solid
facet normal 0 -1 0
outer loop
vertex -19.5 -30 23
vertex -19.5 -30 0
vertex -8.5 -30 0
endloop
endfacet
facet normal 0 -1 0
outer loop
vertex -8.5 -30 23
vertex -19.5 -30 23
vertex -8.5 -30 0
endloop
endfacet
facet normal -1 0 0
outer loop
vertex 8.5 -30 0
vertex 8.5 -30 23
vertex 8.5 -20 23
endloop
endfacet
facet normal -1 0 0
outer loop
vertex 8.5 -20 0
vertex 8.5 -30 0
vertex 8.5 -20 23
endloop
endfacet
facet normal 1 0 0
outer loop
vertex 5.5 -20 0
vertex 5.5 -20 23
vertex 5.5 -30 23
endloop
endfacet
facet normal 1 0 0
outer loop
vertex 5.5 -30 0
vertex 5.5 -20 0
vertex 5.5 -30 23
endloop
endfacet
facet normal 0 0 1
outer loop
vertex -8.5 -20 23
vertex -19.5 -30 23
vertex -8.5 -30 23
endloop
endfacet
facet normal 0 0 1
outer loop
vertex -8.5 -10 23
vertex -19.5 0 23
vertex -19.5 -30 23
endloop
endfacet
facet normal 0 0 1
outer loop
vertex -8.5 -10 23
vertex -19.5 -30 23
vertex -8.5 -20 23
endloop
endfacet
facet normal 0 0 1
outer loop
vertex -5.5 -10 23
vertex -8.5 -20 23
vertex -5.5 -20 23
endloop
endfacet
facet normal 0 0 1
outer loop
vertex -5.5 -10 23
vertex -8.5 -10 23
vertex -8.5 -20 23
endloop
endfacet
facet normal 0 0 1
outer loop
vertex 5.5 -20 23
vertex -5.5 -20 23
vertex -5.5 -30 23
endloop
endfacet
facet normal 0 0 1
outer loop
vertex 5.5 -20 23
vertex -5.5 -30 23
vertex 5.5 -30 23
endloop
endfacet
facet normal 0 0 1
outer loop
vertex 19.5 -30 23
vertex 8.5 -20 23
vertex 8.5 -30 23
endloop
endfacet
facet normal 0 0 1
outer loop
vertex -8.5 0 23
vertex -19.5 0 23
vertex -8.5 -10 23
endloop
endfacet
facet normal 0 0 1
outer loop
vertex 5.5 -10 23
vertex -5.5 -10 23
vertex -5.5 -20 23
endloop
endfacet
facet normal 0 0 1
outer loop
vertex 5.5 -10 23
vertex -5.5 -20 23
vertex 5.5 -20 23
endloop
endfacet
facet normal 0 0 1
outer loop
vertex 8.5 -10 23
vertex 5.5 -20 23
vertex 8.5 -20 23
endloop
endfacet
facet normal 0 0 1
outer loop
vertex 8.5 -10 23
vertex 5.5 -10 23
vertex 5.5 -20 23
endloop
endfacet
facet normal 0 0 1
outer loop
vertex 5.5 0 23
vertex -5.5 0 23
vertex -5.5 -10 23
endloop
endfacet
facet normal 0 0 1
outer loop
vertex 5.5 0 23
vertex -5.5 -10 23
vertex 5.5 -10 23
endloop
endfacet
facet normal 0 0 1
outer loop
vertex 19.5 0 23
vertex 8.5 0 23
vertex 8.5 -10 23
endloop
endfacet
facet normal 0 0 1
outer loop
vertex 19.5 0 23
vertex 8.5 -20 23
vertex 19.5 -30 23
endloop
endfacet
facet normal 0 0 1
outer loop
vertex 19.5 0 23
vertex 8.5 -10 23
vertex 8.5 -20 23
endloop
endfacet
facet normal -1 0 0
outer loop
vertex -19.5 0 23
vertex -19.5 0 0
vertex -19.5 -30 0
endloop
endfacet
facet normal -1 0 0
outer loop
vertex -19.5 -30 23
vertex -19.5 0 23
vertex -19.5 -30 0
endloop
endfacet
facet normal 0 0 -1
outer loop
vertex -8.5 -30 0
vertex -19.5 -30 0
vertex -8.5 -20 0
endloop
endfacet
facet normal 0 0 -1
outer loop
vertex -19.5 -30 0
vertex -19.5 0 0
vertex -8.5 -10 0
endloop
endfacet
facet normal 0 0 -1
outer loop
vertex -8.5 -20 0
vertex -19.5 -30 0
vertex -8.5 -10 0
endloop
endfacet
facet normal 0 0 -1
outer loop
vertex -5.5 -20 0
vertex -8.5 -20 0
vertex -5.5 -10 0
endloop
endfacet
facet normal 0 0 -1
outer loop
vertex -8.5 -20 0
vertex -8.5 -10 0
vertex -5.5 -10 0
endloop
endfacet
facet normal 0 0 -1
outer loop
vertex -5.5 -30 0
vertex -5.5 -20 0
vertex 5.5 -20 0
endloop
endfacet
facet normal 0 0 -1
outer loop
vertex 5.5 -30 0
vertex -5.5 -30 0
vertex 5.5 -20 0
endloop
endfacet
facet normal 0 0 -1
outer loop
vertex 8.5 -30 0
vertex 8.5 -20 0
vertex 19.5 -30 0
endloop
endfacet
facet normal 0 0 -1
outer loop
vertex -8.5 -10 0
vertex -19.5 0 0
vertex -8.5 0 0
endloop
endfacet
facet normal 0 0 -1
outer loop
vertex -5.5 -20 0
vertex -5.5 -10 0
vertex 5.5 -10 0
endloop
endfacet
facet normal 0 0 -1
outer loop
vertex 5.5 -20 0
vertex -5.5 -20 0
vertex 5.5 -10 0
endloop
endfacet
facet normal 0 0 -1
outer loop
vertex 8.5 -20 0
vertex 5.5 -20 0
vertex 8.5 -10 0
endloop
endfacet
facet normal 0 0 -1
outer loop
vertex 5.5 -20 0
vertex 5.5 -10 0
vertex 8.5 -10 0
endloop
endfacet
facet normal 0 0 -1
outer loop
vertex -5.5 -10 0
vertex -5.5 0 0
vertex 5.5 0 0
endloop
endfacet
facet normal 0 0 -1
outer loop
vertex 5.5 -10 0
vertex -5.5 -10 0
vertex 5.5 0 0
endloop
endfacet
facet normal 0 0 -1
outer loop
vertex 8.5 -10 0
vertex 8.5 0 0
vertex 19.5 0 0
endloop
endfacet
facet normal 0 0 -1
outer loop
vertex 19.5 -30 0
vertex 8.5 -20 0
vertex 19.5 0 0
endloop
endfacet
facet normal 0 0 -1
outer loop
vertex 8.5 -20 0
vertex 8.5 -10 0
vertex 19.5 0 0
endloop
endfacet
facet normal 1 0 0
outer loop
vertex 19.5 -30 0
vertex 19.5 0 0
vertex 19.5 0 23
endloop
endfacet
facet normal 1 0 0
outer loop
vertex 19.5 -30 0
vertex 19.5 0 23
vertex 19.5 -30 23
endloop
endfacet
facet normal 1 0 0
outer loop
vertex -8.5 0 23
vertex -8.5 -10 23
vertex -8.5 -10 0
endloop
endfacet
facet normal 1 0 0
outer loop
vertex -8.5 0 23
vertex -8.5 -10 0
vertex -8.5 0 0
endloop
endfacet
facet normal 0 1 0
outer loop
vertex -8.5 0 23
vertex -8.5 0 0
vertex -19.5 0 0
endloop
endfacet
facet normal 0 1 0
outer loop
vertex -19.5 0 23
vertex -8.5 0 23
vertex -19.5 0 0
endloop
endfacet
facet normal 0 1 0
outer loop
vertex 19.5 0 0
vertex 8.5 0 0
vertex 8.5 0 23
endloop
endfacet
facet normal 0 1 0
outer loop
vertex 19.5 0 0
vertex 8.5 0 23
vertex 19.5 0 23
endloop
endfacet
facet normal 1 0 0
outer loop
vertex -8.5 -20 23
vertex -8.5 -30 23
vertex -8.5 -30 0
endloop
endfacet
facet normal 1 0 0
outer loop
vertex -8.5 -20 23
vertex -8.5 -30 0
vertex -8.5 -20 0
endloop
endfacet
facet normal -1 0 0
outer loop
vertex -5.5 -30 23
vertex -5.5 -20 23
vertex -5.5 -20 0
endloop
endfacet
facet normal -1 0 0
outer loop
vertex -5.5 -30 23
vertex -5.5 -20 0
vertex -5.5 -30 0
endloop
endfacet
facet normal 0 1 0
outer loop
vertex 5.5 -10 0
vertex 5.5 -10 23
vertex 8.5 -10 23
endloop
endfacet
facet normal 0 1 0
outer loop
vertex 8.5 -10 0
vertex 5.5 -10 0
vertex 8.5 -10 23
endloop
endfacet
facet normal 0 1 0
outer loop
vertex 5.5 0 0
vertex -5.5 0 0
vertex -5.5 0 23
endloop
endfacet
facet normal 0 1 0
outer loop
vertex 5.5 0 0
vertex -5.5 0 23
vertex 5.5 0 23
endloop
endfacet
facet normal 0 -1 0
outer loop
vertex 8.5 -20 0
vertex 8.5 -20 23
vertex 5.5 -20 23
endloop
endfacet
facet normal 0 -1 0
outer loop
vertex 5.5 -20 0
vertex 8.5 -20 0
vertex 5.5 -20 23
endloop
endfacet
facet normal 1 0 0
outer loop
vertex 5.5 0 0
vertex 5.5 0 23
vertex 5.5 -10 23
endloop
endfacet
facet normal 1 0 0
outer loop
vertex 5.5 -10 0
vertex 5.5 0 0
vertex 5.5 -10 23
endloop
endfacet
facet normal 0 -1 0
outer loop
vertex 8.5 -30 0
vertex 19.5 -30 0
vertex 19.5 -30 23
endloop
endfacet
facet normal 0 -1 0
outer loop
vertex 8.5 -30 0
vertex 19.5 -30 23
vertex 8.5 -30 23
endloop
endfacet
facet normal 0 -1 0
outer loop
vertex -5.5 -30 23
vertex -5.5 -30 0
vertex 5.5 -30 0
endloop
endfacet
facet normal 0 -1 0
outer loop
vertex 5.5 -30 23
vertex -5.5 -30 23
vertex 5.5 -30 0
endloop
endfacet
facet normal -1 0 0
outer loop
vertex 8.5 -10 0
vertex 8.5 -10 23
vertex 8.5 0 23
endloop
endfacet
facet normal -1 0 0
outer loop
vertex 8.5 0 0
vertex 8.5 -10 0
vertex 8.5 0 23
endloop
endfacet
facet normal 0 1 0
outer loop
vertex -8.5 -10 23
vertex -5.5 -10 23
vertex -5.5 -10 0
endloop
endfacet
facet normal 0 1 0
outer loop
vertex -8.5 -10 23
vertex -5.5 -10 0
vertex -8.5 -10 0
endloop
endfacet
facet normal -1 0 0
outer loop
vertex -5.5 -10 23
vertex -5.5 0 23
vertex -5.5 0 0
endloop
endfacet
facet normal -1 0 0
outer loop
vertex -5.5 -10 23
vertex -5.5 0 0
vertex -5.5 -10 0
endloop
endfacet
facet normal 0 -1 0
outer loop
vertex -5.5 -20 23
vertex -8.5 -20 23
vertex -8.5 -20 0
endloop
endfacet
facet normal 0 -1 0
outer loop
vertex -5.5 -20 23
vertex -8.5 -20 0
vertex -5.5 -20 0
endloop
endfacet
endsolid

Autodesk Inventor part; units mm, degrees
ref_plane "YZ Plane" through (0, 0, 0) normal (1, 0, 0) x (0, 1, 0)
ref_plane "XZ Plane" through (0, 0, 0) normal (0, 1, 0) x (-1, 0, 0)
ref_plane "XY Plane" through (0, 0, 0) normal (0, 0, 1) x (1, 0, 0)
sketch "Sketch1" plane through (0, 0, 0) normal (0, 0, 1) x (1, 0, 0)
  line L0 (0, 3.6903) -> (0, -33.2554)
  line L1 (0, 0) -> (5.5, 0)
  line L2 (5.5, 0) -> (5.5, -10)
  line L3 (5.5, -10) -> (8.5, -10)
  line L4 (8.5, -10) -> (8.5, 0)
  line L5 (8.5, 0) -> (19.5, 0)
  line L6 (19.5, 0) -> (19.5, -30)
  line L7 (19.5, -30) -> (8.5, -30)
  line L8 (8.5, -30) -> (8.5, -20)
  line L9 (8.5, -20) -> (5.5, -20)
  line L10 (5.5, -20) -> (5.5, -30)
  line L11 (0, -30) -> (5.5, -30)
  line L12 (0, 0) -> (-5.5, 0)
  line L13 (-5.5, 0) -> (-5.5, -10)
  line L14 (-5.5, -10) -> (-8.5, -10)
  line L15 (-8.5, -10) -> (-8.5, 0)
  line L16 (-8.5, 0) -> (-19.5, 0)
  line L17 (-19.5, 0) -> (-19.5, -30)
  line L18 (-19.5, -30) -> (-8.5, -30)
  line L19 (-8.5, -30) -> (-8.5, -20)
  line L20 (-8.5, -20) -> (-5.5, -20)
  line L21 (-5.5, -20) -> (-5.5, -30)
  line L22 (0, -30) -> (-5.5, -30)
  dimension "d0" = 5.5
  dimension "d1" = 10
  dimension "d2" = 3
  dimension "d3" = 11
  dimension "d4" = 30
  dimension "d5" = 11
  dimension "d6" = 10
  dimension "d7" = 5.5
  dimension "d8" = 3
extrude "Extrusion1" add sketch "Sketch1" along normal blind 23
equation "\"d5\" = d3"
equation "\"d6\" = d1"
equation "\"d7\" = d0"
equation "\"d8\" = d2"
properties part number "CommonGNDVDD" material "ABS Plastic"
